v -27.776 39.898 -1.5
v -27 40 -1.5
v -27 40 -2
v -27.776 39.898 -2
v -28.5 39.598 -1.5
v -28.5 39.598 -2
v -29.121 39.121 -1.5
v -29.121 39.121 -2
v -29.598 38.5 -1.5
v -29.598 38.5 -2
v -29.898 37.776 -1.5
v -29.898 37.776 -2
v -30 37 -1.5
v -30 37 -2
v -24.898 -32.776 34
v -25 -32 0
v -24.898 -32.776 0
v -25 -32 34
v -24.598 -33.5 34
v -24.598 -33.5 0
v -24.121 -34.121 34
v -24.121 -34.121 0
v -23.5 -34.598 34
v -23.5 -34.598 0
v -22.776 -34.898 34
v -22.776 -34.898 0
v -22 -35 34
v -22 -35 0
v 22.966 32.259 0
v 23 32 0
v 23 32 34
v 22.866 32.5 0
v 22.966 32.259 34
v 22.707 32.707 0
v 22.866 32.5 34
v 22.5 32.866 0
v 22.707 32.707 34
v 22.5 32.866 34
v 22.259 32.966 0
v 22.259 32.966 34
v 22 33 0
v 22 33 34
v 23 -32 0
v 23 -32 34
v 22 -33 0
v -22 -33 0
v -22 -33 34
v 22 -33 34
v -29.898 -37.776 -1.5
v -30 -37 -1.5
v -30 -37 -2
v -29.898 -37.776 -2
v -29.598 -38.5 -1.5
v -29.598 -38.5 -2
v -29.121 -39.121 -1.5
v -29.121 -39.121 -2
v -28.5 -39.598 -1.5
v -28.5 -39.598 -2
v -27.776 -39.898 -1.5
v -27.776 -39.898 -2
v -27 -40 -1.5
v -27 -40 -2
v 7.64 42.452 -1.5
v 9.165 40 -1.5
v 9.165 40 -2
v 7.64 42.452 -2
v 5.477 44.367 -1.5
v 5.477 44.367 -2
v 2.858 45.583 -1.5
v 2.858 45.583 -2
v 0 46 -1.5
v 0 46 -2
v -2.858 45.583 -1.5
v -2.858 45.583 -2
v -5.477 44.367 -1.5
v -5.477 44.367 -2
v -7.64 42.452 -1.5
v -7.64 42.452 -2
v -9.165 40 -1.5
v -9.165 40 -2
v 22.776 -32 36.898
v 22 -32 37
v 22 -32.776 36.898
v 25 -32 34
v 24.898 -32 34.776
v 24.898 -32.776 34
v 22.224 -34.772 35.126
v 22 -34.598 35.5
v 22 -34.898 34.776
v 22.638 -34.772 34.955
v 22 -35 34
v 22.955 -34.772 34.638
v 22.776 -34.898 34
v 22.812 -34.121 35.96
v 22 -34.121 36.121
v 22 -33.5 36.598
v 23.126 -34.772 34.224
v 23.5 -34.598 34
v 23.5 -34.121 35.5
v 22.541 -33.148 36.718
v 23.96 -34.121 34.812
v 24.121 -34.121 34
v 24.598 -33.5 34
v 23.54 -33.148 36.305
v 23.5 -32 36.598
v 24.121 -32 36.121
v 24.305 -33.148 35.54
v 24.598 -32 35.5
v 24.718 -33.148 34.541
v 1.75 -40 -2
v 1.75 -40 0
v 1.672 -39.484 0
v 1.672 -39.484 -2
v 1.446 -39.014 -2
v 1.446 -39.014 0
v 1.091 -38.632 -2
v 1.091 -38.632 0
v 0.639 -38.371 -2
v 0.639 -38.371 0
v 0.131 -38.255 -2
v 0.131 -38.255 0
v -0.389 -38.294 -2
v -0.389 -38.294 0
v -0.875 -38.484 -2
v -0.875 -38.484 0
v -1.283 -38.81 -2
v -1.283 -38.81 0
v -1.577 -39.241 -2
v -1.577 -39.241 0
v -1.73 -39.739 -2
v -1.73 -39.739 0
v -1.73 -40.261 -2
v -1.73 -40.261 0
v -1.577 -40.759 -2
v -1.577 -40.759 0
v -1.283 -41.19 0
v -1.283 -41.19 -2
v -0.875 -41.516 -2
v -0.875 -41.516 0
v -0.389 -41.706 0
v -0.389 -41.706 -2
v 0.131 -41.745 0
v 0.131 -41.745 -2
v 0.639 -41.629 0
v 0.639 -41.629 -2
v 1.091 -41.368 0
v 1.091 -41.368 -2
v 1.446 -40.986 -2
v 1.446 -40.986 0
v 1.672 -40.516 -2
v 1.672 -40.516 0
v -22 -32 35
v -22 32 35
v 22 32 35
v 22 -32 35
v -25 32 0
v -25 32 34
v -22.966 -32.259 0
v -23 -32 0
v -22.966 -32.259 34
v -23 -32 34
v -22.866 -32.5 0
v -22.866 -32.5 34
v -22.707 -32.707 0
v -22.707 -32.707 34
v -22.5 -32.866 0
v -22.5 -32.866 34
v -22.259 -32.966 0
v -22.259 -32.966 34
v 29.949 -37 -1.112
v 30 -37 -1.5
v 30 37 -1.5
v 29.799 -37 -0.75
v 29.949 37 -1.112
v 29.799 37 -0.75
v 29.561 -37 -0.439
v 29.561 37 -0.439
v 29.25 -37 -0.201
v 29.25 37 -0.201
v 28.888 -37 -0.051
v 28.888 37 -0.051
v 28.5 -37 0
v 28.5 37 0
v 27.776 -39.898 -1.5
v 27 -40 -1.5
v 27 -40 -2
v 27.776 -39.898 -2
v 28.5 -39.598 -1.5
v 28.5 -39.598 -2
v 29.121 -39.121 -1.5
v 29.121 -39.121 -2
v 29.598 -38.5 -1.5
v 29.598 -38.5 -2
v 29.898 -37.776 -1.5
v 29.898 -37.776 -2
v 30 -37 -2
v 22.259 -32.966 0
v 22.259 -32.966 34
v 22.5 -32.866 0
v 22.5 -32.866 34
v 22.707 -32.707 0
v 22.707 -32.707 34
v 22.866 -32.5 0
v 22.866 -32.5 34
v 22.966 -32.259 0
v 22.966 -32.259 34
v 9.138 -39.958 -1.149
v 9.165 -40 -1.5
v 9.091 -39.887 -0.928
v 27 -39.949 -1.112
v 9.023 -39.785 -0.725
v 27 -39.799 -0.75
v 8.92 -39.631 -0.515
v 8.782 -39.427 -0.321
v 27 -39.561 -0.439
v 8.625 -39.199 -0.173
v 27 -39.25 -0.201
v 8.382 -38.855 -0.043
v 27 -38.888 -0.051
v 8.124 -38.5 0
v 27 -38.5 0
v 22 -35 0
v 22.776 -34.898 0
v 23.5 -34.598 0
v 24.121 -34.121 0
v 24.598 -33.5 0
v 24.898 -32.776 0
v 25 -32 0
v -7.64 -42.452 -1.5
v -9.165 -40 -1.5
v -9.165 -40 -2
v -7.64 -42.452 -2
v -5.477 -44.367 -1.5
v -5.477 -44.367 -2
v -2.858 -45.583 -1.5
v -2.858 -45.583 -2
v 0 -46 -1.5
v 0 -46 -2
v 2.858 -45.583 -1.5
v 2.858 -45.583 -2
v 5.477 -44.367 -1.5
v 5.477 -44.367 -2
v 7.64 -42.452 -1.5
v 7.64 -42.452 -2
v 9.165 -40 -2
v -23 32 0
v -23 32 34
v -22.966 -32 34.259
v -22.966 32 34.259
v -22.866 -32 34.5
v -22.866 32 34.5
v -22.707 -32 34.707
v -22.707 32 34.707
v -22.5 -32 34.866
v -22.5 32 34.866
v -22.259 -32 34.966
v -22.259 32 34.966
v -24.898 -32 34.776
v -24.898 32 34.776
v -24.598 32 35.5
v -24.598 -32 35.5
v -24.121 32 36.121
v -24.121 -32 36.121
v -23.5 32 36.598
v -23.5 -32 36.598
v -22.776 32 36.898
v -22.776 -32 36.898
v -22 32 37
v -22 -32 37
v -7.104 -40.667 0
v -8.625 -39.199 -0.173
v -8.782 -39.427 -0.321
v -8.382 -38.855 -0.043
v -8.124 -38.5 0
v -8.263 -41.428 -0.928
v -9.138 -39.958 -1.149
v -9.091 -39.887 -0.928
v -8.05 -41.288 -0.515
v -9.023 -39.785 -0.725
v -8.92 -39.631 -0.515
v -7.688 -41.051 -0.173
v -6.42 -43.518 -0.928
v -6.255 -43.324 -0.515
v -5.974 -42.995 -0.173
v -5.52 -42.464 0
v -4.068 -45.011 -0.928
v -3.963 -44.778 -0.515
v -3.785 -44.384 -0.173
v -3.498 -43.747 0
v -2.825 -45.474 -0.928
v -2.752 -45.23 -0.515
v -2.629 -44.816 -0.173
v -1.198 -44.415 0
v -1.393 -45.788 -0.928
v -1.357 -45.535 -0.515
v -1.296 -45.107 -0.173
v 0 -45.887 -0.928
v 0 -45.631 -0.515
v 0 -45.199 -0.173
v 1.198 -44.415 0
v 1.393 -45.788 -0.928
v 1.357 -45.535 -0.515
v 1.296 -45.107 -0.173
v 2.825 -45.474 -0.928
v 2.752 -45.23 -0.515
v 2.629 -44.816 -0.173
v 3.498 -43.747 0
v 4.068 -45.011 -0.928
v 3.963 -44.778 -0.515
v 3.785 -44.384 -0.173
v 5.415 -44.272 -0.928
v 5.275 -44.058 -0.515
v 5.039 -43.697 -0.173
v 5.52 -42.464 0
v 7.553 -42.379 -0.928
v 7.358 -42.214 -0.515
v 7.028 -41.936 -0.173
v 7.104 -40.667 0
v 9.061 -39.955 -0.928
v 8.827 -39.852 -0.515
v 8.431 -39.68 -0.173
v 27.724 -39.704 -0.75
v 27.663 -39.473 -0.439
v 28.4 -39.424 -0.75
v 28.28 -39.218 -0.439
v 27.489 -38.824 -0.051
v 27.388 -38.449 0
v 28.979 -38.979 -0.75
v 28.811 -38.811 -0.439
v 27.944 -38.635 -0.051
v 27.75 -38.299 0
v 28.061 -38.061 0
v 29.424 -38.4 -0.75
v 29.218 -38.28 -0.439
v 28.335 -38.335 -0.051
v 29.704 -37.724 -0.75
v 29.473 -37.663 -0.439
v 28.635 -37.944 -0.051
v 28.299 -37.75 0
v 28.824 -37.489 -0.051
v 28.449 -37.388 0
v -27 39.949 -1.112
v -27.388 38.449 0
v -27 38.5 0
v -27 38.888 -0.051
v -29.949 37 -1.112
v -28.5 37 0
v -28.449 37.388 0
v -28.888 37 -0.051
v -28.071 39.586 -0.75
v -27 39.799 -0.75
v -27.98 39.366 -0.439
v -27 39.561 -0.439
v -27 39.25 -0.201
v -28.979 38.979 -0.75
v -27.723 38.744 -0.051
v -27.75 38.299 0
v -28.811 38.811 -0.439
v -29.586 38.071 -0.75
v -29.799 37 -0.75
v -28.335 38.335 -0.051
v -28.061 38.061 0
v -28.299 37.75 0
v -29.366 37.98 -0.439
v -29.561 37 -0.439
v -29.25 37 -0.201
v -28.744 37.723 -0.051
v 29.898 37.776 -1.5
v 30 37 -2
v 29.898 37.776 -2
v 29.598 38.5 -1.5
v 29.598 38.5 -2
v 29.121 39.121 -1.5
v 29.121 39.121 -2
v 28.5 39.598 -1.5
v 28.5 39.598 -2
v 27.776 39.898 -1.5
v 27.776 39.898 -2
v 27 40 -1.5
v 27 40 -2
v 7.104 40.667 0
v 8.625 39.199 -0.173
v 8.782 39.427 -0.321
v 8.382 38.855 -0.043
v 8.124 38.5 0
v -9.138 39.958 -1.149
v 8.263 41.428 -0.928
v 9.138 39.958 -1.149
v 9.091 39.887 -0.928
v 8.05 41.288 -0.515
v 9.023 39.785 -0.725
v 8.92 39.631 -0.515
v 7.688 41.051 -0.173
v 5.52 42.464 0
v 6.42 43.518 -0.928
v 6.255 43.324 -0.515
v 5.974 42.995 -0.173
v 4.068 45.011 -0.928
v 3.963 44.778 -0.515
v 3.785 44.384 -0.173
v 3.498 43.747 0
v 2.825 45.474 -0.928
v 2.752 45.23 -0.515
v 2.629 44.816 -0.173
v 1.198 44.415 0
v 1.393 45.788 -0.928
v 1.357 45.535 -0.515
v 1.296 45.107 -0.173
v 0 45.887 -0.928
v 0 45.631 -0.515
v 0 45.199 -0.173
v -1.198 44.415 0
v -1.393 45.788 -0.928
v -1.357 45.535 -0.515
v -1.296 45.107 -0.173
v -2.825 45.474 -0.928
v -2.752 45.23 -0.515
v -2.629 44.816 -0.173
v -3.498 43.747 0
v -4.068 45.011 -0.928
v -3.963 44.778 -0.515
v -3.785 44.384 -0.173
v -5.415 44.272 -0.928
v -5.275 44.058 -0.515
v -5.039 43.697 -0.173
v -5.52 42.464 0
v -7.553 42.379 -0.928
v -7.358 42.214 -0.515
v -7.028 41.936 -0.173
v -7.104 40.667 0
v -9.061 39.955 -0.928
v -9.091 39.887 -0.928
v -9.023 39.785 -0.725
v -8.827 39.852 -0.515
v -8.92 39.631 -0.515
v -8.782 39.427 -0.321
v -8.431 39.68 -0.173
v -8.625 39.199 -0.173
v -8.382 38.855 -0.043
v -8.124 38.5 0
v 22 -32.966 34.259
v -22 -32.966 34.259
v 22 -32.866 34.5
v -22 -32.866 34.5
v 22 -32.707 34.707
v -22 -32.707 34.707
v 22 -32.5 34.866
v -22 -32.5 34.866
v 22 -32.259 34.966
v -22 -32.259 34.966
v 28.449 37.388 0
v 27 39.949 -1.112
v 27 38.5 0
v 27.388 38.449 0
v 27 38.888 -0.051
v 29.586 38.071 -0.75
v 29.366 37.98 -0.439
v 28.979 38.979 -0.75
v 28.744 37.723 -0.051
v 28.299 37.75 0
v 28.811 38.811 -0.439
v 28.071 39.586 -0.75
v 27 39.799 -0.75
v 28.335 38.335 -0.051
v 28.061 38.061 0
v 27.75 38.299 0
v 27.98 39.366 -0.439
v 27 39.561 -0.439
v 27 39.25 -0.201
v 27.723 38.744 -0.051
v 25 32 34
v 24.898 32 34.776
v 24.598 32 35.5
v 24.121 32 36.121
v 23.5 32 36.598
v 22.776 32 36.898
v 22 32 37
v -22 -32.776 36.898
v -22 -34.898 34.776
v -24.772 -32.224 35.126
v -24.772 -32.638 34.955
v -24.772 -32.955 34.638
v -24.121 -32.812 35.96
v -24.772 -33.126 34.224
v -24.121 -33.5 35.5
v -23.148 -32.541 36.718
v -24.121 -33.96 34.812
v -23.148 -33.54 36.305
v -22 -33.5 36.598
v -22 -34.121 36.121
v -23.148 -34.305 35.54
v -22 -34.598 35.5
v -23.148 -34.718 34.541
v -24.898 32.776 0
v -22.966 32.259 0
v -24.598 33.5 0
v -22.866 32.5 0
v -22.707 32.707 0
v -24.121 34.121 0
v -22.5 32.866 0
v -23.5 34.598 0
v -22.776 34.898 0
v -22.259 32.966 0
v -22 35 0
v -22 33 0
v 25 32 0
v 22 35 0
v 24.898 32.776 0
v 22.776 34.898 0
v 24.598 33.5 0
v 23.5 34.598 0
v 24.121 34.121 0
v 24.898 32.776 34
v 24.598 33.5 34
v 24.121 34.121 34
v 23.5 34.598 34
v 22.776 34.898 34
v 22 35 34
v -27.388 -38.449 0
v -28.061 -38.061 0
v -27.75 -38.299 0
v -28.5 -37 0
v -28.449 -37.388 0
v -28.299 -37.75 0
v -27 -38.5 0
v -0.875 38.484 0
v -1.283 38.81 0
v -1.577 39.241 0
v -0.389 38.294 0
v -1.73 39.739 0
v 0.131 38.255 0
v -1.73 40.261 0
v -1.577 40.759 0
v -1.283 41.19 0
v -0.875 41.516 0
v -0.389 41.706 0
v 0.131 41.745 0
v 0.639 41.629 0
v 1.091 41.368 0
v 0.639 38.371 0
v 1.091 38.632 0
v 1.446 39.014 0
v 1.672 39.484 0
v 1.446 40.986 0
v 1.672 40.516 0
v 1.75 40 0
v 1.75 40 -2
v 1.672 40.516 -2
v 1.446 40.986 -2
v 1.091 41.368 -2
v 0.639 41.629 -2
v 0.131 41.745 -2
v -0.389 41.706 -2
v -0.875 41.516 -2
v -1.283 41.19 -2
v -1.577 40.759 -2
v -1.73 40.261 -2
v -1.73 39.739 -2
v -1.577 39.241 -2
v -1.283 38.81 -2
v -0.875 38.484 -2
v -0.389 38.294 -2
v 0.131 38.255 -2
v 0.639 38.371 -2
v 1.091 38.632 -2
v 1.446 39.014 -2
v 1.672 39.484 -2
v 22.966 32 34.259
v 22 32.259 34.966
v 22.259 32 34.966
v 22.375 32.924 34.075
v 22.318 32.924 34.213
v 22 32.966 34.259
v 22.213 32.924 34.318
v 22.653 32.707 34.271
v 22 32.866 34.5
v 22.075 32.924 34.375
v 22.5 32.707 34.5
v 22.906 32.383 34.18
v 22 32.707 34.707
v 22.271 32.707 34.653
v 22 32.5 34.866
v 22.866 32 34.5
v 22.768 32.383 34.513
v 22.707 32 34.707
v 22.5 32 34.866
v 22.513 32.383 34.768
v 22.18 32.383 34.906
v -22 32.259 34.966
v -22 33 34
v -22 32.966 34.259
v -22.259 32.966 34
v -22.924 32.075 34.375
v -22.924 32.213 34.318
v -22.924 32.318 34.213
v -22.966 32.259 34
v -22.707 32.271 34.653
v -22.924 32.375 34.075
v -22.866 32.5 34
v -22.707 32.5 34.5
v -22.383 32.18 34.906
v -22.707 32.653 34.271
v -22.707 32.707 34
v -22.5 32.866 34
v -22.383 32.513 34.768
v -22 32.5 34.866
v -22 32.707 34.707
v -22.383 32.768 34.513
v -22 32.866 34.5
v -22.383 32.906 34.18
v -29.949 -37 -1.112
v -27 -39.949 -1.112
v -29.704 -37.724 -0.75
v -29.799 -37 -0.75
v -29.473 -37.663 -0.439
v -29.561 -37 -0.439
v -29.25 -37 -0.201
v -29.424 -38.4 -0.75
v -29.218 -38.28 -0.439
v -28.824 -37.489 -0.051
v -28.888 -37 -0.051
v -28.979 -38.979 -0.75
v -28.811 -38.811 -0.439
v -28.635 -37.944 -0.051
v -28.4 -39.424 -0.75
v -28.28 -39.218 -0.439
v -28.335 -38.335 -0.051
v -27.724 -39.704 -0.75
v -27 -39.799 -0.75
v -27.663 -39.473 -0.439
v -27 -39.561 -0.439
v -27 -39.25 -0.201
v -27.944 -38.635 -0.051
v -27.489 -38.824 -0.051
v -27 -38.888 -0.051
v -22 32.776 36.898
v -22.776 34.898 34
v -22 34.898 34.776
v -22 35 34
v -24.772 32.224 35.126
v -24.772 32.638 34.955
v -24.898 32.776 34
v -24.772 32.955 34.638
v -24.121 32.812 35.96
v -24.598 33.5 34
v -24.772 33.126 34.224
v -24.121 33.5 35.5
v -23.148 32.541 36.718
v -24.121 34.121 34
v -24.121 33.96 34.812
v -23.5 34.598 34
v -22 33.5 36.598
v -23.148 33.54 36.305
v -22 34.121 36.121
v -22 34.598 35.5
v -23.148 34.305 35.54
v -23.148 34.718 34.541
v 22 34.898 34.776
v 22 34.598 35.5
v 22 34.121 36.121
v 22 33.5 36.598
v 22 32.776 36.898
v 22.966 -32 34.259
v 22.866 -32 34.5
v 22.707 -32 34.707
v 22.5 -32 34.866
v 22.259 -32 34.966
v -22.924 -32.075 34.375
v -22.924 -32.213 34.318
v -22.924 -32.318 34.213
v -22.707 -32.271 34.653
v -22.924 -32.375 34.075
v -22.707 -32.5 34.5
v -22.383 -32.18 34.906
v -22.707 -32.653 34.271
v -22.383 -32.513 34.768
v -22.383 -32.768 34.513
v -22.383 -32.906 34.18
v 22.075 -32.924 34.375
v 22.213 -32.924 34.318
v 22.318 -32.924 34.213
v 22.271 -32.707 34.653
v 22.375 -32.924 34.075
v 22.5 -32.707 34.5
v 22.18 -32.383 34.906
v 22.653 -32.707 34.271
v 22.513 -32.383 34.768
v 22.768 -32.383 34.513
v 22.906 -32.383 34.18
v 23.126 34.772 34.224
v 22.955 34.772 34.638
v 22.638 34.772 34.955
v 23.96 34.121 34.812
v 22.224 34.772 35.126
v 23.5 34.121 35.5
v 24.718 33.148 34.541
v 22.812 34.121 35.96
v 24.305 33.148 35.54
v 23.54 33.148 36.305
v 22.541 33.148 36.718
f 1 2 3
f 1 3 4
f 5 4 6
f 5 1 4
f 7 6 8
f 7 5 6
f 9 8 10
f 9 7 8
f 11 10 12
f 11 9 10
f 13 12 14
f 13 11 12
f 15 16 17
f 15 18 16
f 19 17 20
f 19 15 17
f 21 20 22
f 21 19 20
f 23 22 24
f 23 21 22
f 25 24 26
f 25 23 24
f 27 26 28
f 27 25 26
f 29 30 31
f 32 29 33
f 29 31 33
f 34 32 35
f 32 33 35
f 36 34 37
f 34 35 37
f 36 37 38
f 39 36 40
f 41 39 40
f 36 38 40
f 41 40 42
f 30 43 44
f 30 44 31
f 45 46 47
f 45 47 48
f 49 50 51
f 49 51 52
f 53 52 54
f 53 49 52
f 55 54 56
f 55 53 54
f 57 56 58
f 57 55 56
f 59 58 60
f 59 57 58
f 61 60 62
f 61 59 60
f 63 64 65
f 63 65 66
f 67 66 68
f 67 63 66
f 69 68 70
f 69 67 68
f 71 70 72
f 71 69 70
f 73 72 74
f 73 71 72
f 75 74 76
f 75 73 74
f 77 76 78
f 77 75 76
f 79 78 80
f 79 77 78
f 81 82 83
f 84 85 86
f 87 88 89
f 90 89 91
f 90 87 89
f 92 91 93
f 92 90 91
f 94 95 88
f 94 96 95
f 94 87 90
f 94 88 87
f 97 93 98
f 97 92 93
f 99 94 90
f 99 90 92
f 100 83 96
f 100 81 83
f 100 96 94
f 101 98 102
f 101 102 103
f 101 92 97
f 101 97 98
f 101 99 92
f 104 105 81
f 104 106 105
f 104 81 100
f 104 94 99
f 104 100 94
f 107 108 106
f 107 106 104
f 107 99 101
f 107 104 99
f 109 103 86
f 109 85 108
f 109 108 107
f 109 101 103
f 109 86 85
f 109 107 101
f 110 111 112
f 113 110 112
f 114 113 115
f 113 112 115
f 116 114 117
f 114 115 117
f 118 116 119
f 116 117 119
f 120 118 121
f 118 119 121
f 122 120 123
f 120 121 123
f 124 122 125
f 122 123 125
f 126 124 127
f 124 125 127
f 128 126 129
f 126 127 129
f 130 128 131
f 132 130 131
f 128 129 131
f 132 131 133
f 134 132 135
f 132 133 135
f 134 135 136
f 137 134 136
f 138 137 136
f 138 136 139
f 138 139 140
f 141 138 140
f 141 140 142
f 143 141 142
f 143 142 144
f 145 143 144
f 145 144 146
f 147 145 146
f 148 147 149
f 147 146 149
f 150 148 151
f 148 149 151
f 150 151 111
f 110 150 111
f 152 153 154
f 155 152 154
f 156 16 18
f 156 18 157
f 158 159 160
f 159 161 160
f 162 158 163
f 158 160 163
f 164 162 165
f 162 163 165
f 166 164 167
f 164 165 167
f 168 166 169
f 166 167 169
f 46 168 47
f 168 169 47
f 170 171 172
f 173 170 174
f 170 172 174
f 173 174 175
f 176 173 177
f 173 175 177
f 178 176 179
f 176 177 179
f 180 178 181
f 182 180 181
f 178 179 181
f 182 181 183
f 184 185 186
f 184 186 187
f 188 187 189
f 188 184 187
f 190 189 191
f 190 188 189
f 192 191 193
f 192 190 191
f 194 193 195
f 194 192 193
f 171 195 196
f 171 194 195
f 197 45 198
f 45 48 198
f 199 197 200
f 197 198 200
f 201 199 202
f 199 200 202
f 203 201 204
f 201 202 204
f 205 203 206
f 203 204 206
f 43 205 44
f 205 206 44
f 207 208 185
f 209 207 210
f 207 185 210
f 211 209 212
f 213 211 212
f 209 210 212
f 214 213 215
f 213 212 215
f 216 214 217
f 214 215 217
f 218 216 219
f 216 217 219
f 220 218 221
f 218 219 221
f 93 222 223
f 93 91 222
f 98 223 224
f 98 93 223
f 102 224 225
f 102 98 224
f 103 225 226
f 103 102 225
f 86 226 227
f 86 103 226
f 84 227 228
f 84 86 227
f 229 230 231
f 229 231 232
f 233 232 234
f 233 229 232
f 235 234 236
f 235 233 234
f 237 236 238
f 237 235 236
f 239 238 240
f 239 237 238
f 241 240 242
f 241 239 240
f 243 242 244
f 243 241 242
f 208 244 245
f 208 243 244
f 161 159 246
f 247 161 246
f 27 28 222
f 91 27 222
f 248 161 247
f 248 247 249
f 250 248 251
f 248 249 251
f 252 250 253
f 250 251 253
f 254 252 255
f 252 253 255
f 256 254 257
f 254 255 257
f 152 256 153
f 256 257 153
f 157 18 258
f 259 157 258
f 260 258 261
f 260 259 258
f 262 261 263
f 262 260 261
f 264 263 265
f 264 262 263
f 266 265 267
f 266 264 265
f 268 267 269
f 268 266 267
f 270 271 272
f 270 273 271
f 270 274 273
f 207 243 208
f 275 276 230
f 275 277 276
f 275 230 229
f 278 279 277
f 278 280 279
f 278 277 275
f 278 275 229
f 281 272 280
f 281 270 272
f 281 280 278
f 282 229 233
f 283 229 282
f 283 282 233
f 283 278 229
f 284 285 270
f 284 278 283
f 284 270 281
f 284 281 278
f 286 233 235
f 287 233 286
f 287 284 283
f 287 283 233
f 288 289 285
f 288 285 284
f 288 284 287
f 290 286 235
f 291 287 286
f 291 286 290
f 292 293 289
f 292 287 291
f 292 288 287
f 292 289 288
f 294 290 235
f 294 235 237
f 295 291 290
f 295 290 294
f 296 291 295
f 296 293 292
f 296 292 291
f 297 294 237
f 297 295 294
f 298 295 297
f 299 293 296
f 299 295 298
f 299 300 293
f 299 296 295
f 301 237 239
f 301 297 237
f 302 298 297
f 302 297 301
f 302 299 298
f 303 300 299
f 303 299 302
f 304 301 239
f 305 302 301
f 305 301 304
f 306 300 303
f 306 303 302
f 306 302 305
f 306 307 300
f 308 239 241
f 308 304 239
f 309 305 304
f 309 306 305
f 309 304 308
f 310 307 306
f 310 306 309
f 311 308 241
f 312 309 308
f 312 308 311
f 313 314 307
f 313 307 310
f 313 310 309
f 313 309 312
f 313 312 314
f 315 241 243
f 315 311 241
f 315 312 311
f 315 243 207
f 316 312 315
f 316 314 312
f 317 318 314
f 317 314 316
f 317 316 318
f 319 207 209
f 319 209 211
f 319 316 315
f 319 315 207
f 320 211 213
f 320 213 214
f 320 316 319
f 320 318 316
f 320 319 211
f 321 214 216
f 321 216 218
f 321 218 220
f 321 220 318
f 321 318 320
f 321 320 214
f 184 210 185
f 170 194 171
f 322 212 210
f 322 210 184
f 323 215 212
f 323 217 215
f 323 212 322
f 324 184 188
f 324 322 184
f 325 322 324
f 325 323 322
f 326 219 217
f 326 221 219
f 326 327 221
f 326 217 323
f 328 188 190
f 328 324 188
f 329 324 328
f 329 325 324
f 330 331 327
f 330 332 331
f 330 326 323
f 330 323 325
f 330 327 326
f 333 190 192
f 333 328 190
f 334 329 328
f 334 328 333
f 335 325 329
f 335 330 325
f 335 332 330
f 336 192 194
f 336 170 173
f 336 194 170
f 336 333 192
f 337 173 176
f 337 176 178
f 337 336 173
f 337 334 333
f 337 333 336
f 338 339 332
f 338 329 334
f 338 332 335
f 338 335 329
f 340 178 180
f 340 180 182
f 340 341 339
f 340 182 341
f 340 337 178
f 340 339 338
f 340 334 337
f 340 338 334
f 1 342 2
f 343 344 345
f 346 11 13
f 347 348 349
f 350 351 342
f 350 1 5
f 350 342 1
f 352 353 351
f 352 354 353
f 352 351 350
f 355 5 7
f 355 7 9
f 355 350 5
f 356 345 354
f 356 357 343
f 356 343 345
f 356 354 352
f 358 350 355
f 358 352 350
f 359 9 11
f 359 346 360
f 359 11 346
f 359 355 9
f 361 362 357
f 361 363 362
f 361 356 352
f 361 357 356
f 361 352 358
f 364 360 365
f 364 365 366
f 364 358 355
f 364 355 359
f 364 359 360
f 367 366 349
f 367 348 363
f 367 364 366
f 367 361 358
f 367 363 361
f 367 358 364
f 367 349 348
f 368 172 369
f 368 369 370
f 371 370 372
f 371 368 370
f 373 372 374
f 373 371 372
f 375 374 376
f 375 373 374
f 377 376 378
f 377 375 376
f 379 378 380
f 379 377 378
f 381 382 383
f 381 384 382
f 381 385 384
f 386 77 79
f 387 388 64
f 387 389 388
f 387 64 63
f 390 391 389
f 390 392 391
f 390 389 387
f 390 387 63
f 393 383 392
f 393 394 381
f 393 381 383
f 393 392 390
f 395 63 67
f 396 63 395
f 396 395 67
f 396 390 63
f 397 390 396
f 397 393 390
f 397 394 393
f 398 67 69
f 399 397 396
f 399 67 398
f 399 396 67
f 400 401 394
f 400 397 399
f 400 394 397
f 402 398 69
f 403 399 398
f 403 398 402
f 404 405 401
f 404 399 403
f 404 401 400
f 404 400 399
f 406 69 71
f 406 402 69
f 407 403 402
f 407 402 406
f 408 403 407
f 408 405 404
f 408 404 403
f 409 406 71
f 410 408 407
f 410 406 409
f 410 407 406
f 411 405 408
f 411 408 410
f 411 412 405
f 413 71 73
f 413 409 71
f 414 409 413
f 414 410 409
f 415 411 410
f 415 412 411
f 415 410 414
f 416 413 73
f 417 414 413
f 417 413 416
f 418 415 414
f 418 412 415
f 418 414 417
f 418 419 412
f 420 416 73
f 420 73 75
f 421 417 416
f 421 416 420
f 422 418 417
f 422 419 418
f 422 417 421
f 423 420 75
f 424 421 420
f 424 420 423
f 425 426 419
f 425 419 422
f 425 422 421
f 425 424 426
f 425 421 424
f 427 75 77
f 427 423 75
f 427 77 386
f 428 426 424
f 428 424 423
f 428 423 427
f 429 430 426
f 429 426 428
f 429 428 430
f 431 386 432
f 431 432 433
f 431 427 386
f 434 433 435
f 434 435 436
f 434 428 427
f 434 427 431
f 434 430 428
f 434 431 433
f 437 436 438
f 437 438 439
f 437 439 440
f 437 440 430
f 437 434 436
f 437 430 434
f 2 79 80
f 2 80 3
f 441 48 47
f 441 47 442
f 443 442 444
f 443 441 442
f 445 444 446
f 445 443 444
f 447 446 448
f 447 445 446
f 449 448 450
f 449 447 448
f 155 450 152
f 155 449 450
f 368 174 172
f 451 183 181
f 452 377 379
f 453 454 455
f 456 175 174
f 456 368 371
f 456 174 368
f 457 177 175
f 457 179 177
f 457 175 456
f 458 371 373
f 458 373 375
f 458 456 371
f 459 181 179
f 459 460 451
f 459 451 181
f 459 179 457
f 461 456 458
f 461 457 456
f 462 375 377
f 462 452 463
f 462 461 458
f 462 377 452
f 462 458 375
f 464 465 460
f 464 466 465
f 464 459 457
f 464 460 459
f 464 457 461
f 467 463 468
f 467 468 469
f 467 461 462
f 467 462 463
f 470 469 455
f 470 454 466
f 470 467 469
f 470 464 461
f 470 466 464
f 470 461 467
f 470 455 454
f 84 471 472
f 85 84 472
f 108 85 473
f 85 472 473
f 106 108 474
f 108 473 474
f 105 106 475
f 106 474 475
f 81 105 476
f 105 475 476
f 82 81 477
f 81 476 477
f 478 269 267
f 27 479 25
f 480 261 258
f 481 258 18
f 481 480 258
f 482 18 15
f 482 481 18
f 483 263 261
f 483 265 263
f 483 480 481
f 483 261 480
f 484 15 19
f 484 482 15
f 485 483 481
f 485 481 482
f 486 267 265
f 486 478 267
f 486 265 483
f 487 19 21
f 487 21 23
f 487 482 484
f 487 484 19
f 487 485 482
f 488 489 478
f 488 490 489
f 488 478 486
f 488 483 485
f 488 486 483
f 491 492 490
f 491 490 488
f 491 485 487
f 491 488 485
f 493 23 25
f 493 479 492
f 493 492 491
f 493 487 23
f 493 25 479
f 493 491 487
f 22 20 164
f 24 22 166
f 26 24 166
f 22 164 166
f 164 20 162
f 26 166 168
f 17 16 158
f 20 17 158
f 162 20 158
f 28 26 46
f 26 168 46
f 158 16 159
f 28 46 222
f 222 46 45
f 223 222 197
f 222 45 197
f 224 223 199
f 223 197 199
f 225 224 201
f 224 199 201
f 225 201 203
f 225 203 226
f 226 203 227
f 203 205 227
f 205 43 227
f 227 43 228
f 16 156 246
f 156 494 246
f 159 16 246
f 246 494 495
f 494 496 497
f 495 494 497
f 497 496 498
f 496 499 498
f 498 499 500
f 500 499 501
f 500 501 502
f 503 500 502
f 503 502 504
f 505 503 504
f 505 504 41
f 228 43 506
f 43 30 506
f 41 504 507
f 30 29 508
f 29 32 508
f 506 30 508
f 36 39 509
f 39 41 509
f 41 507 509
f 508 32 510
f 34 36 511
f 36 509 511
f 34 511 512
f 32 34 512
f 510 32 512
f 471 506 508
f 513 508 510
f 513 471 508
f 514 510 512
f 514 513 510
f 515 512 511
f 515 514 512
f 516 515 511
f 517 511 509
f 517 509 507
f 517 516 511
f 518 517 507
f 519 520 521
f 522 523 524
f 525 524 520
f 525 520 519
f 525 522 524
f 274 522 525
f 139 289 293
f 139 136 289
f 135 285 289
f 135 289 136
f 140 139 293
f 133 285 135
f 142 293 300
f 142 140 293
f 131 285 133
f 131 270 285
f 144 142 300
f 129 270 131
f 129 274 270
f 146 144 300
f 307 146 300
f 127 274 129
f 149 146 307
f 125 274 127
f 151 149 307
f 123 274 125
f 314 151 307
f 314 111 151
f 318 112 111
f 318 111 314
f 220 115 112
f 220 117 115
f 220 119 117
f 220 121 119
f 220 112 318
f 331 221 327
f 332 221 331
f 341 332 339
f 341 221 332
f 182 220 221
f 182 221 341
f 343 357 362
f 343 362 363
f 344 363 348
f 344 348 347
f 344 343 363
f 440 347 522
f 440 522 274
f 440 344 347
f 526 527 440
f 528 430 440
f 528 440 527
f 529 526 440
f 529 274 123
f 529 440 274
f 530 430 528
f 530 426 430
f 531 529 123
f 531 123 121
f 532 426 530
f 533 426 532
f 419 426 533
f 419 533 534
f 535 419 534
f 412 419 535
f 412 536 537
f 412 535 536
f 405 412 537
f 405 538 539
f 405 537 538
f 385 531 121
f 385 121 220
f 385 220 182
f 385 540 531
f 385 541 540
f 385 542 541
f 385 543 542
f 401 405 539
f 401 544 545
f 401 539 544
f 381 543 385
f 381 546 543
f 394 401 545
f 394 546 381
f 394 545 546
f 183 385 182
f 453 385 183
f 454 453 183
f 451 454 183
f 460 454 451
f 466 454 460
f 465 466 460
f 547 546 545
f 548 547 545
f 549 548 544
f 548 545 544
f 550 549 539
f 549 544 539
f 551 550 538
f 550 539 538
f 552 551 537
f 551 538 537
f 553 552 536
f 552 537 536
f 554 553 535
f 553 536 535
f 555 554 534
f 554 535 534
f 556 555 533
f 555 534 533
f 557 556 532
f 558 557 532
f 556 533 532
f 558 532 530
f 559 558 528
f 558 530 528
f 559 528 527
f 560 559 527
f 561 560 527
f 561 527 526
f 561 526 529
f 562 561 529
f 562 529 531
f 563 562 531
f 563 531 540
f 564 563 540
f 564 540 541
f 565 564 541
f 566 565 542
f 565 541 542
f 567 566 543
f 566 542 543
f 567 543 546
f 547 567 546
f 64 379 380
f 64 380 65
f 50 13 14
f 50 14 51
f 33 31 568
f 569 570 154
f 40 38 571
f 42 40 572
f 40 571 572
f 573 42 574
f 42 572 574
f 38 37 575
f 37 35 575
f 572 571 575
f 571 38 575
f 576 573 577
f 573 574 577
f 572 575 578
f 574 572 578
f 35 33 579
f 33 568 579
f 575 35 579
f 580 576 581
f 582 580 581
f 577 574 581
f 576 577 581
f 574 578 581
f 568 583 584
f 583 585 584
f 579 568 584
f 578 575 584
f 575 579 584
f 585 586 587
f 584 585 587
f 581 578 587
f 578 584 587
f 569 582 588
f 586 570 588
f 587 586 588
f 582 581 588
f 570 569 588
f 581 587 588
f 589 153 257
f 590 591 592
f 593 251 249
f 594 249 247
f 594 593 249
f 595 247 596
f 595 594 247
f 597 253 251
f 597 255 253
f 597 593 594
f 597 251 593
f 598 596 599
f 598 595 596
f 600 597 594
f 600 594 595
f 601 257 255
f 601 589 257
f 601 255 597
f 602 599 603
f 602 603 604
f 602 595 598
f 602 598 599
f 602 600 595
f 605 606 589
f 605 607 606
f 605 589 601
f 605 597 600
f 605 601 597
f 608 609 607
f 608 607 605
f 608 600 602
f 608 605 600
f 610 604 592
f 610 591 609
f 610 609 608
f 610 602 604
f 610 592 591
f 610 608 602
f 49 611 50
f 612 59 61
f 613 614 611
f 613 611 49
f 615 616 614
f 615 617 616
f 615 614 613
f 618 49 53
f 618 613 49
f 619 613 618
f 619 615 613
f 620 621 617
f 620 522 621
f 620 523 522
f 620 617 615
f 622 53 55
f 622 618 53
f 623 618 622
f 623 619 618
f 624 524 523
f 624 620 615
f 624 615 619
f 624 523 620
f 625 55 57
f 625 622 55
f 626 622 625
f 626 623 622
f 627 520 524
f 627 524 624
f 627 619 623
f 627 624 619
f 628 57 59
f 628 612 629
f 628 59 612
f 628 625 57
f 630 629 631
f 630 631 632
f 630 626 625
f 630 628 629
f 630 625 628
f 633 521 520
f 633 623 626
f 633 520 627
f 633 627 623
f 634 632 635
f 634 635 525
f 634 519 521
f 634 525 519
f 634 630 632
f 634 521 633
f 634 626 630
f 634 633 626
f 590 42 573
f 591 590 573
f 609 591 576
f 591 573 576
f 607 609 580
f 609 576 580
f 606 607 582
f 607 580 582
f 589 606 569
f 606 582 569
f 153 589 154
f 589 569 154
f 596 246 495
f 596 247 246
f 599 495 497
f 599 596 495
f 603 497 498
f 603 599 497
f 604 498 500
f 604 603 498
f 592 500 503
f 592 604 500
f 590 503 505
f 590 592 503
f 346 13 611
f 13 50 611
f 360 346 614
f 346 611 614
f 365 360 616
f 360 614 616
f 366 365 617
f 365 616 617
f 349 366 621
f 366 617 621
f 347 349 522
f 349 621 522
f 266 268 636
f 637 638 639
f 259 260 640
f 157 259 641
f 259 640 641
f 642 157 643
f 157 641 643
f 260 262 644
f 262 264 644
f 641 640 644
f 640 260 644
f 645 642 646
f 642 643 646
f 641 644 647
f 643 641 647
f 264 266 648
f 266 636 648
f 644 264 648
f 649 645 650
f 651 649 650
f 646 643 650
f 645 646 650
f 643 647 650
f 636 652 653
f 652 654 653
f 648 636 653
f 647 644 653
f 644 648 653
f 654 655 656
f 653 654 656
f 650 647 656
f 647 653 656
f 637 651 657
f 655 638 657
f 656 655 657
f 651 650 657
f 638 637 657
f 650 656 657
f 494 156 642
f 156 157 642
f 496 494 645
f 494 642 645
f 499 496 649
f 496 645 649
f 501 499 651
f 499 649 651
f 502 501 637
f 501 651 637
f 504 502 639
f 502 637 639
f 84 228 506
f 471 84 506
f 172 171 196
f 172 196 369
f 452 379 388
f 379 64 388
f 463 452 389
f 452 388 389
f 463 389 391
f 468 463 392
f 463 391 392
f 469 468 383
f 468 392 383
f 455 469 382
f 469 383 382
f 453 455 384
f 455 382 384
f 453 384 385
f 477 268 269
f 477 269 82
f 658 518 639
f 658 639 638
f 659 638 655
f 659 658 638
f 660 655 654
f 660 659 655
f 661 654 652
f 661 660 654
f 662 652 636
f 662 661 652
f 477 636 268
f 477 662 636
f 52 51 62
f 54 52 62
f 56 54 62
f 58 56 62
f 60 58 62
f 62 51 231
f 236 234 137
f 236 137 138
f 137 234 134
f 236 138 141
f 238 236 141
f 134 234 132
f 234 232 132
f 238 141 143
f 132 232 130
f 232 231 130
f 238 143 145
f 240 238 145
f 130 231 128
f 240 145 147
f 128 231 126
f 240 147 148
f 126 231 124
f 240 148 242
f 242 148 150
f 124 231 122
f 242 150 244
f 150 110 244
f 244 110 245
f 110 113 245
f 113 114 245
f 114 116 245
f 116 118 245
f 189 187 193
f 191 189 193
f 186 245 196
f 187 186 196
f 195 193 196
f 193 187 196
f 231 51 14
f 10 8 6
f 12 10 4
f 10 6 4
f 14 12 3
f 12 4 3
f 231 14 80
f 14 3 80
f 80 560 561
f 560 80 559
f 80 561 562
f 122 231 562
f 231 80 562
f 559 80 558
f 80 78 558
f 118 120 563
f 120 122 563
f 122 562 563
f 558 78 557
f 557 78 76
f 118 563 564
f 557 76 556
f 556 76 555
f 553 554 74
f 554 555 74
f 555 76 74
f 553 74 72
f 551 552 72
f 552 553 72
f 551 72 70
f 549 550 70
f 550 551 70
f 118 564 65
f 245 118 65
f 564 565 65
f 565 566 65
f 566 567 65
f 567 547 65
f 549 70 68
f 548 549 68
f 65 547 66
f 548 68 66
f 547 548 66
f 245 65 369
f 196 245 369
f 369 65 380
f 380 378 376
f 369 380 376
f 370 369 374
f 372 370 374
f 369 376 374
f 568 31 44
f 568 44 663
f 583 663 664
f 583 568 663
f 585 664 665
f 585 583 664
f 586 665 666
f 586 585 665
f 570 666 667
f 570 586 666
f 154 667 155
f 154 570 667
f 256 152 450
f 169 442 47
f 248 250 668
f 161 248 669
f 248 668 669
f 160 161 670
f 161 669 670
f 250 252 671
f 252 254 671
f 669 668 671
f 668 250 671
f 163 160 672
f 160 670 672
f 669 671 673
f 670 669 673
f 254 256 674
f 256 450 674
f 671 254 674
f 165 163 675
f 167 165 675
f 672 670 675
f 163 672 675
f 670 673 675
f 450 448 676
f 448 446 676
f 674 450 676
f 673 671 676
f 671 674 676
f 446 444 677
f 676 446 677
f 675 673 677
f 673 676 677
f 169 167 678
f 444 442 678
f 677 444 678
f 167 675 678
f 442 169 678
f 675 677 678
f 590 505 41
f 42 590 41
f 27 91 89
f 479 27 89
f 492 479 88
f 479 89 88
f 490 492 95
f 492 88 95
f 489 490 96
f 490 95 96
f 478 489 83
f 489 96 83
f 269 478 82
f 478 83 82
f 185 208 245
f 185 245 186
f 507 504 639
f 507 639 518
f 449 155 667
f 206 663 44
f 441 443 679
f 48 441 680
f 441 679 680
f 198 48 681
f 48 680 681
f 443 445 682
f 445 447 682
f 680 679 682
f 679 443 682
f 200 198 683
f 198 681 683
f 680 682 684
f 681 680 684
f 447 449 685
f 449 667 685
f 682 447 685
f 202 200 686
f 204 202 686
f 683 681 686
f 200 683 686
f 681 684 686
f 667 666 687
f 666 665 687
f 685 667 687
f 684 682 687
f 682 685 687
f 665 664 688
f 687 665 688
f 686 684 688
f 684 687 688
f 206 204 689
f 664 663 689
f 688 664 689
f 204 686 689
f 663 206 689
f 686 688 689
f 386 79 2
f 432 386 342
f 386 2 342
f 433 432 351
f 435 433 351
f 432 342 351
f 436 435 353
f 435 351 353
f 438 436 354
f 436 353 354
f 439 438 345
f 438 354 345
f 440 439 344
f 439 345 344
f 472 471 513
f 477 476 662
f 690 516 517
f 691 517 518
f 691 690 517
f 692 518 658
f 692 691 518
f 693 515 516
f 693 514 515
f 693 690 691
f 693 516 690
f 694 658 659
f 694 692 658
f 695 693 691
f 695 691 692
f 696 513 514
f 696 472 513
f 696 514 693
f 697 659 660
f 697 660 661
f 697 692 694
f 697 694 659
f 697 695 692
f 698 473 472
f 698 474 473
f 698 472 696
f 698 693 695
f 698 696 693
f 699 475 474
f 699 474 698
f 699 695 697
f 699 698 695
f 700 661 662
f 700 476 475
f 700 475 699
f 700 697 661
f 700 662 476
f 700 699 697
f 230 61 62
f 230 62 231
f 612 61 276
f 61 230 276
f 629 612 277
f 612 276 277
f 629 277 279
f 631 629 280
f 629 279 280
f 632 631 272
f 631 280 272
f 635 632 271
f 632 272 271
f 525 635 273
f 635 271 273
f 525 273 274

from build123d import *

# Parameters (mm, degrees)
F0_W     = 50
F0_H     = 70
F1_DEPTH = 37
F2_R     = 3
F3_T     = -2
F4_R     = 1.75
F5_DEPTH = 2
F6_R     = 1.5


# Not quite as in the source:
# - ends of sketch curves that miss each other by under 0.0002 mm in the source are joined
# - a feature names something its author has since deleted; it is built from what else it names


with BuildPart() as f1:
    # F0 (on Top) → F1 (new body)
    with BuildSketch(Plane.XY):
        Rectangle(F0_W, F0_H)
    extrude(amount=F1_DEPTH)

    # F2
    f2_edges = [f1.edges().sort_by_distance(p)[0] for p in [
        (25, 0, 37),
        (0, -35, 37),
        (25, -35, 18.5),
        (25, 35, 18.5),
        (0, 35, 37),
        (-25, 0, 37),
        (-25, -35, 18.5),
        (-25, 35, 18.5),
    ]]
    fillet(f2_edges, radius=F2_R)

    # F3
    f3_openings = [f1.faces().sort_by_distance(p)[0] for p in [
        (0, 0, 0),
    ]]
    offset(amount=F3_T, openings=f3_openings)


with BuildPart() as f5:
    # F4 (on Top) → F5 (new body)
    with BuildSketch(Plane.XY):
        with BuildLine():
            Line((9.1651513899, -40), (27, -40))
            ThreePointArc((27, -40), (29.1213201989, -39.1213204882), (30, -37.000000409))
            Line((30, -37.000000409), (30, 37.000000409))
            ThreePointArc((30, 37.000000409), (29.1213203436, 39.1213207526), (27, 40.000000409))
            Line((27, 40.000000409), (9.1651513899, 40))
            ThreePointArc((9.1651513899, 40), (0, 46), (-9.1651513899, 40))
            Line((-9.1651513899, 40), (-27, 40))
            ThreePointArc((-27, 40), (-29.1213202871, 39.121320809), (-30, 37.0000005686))
            Line((-30, 37.0000005686), (-30, -37.0000005686))
            ThreePointArc((-30, -37.0000005686), (-29.1213201425, -39.1213205446), (-27, -40))
            Line((-27, -40), (-9.1651513899, -40))
            ThreePointArc((-9.1651513899, -40), (0, -46), (9.1651513899, -40))
        make_face()
        with Locations((0, -40)):
            Circle(F4_R, mode=Mode.SUBTRACT)
        with Locations((0, 40)):
            Circle(F4_R, mode=Mode.SUBTRACT)
    extrude(amount=-F5_DEPTH)

    # F6
    f6_edges = [f5.edges().sort_by_distance(p)[0] for p in [
        (-30, 0, 0),
        (0, 46, 0),
        (18.082576, 40, 0),
        (29.12132, 39.121321, 0),
        (0, -46, 0),
    ]]
    fillet(f6_edges, radius=F6_R)


solid = Compound([f1.part, f5.part])
